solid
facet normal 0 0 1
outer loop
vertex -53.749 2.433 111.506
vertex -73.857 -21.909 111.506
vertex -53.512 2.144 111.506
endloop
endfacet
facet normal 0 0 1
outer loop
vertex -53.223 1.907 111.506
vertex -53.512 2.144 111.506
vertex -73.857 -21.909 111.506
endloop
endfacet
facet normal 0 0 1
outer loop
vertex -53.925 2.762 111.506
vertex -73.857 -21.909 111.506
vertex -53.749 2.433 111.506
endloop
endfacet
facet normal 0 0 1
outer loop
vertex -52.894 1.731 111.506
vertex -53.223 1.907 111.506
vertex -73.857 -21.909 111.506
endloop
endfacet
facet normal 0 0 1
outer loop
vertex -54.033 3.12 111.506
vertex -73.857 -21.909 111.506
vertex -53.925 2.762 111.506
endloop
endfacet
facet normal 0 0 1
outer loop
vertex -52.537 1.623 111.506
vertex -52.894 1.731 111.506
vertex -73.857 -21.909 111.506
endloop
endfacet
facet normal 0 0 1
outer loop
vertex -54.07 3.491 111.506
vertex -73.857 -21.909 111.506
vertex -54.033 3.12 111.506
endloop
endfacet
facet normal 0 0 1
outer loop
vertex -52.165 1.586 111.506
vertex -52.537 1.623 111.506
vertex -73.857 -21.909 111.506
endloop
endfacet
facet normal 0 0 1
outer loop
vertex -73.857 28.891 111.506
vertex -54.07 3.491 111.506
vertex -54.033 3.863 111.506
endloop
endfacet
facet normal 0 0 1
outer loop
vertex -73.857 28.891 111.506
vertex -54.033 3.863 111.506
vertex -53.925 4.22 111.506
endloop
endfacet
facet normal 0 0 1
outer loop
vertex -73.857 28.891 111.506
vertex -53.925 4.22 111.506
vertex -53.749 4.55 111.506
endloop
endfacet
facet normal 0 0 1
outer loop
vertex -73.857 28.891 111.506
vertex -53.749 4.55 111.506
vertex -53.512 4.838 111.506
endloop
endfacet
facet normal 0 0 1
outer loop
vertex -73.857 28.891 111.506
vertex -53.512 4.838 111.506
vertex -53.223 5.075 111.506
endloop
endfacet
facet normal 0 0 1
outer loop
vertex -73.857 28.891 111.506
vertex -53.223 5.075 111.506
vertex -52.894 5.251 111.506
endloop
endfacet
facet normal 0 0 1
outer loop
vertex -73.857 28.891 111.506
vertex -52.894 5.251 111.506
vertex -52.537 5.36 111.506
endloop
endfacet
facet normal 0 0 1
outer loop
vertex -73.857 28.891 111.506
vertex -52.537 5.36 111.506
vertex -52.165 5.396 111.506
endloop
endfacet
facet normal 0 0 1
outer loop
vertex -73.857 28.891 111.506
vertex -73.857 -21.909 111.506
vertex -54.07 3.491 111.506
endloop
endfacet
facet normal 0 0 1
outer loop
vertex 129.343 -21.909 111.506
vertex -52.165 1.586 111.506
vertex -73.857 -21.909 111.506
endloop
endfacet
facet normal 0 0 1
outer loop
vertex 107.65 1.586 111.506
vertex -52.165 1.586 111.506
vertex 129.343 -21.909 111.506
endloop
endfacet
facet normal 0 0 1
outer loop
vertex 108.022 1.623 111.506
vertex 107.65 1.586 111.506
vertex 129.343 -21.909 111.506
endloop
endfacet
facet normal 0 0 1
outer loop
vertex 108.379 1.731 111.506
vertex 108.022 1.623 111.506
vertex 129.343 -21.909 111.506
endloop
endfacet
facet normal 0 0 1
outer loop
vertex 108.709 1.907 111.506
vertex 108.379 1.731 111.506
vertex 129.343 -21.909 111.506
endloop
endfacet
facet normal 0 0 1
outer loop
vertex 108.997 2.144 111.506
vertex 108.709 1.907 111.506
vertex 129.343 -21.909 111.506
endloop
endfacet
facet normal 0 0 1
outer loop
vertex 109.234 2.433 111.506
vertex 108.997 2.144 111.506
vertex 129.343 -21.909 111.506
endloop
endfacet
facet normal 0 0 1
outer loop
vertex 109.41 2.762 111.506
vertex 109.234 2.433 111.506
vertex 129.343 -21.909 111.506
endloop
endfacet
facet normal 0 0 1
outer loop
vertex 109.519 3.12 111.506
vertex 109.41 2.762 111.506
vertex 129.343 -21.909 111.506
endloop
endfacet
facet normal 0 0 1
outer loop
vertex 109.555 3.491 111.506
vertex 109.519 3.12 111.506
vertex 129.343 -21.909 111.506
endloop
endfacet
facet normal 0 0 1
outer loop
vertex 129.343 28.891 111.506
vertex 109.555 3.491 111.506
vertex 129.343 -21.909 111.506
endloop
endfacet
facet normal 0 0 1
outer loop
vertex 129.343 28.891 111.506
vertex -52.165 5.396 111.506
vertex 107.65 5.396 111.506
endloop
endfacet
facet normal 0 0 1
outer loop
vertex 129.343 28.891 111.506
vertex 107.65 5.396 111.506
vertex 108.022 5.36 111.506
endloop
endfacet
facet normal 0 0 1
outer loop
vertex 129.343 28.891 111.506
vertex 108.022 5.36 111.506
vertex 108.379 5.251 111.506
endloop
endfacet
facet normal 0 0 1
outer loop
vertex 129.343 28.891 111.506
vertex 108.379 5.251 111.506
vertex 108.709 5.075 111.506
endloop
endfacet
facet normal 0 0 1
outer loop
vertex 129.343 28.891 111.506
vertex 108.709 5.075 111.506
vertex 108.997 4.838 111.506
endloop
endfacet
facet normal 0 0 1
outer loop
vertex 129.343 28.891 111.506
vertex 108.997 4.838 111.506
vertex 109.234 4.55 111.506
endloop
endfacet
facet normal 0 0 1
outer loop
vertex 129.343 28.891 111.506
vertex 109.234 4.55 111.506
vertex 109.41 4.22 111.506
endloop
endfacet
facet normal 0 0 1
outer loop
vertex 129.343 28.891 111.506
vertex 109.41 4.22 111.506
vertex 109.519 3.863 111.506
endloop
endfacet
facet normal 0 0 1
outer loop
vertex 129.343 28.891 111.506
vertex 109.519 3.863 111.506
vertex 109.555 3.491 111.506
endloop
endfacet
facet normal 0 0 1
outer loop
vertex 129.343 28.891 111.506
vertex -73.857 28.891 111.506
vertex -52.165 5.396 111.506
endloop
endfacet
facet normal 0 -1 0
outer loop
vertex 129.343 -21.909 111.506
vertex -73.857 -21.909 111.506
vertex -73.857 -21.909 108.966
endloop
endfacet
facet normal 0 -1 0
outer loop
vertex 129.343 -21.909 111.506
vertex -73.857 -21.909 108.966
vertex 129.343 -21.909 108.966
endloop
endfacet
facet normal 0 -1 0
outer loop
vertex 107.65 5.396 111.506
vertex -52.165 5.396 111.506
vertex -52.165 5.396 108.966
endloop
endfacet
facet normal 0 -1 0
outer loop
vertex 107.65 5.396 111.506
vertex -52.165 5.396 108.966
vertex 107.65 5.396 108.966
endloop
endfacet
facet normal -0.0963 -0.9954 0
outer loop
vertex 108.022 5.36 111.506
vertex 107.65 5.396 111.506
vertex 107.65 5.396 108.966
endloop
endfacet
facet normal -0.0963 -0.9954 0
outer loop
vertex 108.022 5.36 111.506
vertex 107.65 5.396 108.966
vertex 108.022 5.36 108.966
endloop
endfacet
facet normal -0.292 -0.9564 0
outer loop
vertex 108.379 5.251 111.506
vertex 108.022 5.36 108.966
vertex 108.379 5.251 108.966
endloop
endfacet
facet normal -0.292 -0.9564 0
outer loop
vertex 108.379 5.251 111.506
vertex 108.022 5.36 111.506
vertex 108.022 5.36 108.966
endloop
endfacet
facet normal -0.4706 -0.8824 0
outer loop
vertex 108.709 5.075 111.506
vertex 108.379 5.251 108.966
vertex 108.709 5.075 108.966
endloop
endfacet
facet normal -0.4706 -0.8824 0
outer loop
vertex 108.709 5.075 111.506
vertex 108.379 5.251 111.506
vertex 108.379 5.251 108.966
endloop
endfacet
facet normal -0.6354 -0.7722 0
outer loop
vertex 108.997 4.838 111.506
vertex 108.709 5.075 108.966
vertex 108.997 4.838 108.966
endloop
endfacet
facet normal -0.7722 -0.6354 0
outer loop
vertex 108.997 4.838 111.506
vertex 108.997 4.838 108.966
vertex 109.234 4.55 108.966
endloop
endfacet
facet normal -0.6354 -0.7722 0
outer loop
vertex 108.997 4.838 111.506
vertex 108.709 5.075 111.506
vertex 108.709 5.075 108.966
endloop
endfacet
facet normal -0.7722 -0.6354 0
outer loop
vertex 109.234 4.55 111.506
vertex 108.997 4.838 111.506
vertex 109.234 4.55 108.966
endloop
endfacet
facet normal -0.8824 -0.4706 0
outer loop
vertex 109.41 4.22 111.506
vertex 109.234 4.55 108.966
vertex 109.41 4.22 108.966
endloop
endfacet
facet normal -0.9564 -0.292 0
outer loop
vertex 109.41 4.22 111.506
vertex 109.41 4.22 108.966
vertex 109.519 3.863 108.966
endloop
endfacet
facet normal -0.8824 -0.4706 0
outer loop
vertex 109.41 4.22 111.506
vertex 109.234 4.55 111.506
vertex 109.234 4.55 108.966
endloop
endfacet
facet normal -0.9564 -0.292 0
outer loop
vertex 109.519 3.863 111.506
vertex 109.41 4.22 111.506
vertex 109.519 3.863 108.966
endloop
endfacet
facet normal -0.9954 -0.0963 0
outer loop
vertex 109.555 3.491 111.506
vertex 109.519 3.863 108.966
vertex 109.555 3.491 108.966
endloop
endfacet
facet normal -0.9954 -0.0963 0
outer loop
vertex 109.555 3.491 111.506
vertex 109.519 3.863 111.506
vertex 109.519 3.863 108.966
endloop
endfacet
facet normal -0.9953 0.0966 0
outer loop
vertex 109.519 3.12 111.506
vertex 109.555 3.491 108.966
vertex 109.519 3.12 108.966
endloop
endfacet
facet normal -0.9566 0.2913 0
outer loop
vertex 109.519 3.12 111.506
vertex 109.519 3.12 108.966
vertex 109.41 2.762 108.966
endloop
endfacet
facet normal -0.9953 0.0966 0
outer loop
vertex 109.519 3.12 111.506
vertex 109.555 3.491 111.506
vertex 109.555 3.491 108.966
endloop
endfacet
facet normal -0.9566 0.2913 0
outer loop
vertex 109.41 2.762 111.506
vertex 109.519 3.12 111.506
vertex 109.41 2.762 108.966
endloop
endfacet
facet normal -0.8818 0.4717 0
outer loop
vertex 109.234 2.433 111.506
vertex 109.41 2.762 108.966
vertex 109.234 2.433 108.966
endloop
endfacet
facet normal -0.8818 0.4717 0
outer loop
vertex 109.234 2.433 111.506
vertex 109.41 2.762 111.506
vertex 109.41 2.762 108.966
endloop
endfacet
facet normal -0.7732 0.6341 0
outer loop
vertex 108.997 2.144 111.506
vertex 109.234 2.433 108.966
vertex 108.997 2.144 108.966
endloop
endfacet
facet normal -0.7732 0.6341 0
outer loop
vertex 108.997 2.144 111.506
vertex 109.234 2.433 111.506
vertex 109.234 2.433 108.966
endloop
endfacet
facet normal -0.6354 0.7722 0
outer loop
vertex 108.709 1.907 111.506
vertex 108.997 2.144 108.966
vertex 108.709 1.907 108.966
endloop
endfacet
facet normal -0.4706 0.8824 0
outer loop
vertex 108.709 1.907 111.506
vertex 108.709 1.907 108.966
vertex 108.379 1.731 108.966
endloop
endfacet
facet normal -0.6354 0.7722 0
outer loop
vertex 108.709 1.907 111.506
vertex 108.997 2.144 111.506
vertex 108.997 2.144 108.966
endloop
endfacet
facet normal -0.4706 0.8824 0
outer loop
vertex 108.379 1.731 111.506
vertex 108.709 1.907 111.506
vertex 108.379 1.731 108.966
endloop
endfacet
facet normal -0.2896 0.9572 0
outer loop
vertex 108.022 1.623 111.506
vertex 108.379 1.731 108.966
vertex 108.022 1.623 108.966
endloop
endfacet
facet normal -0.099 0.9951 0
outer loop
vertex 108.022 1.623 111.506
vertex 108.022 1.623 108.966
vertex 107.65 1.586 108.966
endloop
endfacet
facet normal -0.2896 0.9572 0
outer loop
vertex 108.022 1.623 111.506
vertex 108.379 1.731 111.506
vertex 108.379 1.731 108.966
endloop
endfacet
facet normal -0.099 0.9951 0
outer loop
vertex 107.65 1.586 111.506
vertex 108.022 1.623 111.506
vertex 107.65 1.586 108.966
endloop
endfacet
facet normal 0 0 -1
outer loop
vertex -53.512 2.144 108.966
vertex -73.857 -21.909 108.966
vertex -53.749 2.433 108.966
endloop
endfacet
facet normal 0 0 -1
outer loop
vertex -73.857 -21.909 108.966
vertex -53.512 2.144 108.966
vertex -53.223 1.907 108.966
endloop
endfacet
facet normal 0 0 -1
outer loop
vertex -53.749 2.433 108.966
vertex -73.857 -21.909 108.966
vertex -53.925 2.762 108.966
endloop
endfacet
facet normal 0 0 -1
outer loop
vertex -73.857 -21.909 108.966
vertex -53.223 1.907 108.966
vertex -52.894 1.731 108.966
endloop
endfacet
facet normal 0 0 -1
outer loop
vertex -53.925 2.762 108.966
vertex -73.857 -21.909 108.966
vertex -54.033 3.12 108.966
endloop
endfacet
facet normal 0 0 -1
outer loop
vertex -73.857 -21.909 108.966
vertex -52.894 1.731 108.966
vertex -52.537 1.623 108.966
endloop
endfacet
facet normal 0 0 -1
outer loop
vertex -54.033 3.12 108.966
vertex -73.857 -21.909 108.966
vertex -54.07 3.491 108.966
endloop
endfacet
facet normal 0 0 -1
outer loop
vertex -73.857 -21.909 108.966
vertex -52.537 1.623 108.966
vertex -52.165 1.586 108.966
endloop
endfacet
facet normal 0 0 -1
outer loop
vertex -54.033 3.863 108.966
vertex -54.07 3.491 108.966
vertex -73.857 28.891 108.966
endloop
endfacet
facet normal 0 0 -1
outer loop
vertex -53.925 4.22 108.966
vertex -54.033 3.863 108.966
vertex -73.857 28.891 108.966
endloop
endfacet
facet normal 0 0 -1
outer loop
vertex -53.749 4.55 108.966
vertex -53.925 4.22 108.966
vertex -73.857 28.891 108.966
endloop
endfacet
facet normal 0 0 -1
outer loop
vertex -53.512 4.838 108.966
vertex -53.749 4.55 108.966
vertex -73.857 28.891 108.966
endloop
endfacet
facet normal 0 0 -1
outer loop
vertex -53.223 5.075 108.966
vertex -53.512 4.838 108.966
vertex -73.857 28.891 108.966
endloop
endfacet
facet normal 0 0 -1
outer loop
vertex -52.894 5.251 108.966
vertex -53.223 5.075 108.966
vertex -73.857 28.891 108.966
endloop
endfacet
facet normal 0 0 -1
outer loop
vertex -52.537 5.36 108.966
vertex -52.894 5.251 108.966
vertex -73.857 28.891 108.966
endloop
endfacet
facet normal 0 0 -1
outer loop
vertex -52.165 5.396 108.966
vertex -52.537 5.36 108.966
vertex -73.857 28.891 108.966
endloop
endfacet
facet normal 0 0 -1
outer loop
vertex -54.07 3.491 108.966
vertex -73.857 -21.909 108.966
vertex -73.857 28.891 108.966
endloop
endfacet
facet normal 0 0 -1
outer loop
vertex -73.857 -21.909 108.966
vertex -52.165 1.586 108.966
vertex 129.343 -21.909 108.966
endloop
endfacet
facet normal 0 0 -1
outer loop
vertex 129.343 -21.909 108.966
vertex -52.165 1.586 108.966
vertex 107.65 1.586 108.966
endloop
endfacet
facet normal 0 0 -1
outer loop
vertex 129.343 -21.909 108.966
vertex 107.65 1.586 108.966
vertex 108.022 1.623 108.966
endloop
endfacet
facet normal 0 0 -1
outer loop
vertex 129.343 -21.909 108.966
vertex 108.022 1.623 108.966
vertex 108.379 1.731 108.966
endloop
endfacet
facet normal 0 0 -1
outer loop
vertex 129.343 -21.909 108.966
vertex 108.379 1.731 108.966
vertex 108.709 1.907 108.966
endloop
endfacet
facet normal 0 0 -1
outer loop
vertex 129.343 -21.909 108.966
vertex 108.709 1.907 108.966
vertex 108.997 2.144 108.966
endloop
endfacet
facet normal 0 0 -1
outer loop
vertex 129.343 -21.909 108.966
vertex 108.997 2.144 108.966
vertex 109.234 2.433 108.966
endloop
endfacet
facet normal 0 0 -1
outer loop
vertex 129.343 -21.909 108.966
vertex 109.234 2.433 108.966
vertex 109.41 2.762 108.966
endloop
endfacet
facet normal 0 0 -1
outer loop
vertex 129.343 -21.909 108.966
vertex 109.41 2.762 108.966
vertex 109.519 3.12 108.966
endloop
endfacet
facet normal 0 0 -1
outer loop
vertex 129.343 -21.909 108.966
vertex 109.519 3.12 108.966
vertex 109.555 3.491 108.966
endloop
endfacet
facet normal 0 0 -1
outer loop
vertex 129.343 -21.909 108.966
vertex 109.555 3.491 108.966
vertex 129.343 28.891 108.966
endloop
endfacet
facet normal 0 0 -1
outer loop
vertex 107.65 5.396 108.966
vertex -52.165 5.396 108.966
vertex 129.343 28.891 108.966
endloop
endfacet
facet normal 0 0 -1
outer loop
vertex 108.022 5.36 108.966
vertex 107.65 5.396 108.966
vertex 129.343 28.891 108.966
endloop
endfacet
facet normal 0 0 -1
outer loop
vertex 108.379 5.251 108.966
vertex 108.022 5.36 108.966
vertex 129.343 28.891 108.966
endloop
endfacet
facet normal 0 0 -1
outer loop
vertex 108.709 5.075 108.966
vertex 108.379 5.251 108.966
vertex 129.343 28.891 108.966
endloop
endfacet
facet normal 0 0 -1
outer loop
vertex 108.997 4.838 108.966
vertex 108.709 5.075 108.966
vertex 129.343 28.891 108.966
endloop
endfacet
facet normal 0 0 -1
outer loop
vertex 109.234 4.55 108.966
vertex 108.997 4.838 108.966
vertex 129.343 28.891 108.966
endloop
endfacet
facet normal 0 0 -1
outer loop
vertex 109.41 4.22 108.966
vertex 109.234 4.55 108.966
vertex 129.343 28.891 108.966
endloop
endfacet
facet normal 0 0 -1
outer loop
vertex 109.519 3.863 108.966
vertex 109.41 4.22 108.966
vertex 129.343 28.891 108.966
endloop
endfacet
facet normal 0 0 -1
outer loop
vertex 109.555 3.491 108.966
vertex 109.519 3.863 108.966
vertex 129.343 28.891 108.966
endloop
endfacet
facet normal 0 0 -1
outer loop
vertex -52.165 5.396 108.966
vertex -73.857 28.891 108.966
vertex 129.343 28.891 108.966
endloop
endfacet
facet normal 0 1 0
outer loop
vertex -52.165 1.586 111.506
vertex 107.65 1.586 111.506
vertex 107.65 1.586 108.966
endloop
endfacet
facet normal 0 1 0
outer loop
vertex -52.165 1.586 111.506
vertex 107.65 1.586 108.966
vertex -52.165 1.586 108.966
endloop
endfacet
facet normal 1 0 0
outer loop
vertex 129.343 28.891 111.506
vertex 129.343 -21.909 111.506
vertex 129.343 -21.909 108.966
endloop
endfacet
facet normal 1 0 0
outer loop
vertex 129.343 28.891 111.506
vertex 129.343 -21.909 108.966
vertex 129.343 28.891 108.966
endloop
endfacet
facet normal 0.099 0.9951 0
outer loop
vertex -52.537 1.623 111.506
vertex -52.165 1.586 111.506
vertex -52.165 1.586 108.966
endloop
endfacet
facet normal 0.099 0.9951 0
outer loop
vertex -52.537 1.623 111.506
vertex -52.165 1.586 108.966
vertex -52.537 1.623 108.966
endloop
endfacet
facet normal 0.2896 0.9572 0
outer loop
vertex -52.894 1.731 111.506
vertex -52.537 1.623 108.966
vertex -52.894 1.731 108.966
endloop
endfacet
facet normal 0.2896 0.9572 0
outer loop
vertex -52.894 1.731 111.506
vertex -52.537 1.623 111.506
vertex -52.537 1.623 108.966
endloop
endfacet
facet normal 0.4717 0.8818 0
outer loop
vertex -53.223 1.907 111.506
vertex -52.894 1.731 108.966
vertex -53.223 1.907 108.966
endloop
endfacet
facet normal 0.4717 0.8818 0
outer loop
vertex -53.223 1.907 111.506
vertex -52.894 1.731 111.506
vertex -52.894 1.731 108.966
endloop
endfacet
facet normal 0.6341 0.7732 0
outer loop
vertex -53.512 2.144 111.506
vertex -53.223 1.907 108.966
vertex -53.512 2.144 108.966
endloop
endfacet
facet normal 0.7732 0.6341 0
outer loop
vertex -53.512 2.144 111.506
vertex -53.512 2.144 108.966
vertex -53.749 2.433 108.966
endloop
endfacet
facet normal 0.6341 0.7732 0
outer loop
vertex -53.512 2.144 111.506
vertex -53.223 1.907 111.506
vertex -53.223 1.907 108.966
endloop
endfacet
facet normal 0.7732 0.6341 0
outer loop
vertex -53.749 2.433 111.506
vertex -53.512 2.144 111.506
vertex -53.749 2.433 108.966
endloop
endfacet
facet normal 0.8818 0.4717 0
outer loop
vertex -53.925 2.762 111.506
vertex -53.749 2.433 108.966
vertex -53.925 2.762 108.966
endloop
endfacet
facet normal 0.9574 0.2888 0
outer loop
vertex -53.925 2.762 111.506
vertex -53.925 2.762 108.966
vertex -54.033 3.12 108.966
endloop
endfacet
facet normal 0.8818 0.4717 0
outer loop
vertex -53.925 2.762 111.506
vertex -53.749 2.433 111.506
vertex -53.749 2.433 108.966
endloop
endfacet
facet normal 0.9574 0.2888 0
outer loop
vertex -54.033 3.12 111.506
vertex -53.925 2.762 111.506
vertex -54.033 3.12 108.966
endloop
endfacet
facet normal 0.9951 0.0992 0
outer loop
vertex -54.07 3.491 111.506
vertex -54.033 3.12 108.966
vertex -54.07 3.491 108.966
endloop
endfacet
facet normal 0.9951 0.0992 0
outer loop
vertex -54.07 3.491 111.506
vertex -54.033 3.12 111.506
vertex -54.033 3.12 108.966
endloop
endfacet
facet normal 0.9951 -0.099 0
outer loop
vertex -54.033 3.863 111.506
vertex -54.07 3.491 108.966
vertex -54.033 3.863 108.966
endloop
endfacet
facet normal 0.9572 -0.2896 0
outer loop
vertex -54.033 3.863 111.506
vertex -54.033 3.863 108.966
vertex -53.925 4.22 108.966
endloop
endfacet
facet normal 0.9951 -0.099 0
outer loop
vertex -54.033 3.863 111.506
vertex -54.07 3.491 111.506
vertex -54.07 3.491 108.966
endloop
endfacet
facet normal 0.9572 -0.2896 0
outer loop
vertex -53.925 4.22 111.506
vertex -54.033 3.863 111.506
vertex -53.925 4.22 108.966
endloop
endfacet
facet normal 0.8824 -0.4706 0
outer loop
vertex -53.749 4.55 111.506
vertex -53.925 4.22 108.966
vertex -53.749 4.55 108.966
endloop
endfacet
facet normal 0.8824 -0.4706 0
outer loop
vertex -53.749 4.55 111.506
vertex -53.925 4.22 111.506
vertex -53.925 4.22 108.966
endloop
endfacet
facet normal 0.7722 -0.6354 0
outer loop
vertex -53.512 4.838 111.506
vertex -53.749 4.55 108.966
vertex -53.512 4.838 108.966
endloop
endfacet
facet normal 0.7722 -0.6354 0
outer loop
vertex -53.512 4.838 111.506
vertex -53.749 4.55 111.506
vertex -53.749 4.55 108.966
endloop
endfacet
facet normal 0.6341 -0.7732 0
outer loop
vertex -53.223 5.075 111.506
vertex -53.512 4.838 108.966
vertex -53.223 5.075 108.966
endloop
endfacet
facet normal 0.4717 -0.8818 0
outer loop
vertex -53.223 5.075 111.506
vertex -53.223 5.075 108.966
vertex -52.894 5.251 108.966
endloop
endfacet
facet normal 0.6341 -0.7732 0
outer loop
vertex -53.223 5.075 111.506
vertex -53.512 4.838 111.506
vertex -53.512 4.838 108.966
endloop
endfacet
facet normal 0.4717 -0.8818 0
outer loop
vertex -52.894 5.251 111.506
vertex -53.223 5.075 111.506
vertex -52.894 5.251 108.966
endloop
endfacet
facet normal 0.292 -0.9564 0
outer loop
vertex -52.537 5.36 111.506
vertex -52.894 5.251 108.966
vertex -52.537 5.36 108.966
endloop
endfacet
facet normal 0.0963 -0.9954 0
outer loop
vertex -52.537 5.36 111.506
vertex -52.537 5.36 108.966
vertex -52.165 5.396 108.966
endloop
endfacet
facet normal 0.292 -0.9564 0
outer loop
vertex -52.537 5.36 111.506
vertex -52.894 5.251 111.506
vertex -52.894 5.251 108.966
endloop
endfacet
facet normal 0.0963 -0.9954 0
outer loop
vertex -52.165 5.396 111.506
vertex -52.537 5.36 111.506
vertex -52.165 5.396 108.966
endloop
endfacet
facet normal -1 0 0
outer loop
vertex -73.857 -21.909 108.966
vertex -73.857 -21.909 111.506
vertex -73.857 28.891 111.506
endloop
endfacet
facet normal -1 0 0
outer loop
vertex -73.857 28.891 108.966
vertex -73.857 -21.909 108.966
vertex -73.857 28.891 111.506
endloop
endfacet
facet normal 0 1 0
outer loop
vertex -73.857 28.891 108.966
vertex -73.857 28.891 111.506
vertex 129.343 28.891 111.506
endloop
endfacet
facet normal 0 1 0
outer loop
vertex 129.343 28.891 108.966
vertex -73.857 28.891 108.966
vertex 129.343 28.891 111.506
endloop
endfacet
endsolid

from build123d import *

# Parameters (mm, degrees)
SKETCH1_W           = 203.2
SKETCH1_H           = 50.8
BOSS_EXTRUDE1_DEPTH = 2.54


with BuildPart() as part:
    # Sketch1 → Boss-Extrude1 (new body)
    with BuildSketch(Plane.XY.offset(111.506)):
        with Locations((27.742628903, 3.491347131)):
            Rectangle(SKETCH1_W, SKETCH1_H)
        with BuildLine():
            Line((-52.164996369, 5.396347131), (107.650254176, 5.396347131))
            ThreePointArc((107.650254176, 5.396347131), (109.555254176, 3.491347131), (107.650254176, 1.586347131))
            Line((107.650254176, 1.586347131), (-52.164996369, 1.586347131))
            ThreePointArc((-52.164996369, 1.586347131), (-54.069996369, 3.491347131), (-52.164996369, 5.396347131))
        make_face(mode=Mode.SUBTRACT)
    extrude(amount=-BOSS_EXTRUDE1_DEPTH)


solid = part.part
